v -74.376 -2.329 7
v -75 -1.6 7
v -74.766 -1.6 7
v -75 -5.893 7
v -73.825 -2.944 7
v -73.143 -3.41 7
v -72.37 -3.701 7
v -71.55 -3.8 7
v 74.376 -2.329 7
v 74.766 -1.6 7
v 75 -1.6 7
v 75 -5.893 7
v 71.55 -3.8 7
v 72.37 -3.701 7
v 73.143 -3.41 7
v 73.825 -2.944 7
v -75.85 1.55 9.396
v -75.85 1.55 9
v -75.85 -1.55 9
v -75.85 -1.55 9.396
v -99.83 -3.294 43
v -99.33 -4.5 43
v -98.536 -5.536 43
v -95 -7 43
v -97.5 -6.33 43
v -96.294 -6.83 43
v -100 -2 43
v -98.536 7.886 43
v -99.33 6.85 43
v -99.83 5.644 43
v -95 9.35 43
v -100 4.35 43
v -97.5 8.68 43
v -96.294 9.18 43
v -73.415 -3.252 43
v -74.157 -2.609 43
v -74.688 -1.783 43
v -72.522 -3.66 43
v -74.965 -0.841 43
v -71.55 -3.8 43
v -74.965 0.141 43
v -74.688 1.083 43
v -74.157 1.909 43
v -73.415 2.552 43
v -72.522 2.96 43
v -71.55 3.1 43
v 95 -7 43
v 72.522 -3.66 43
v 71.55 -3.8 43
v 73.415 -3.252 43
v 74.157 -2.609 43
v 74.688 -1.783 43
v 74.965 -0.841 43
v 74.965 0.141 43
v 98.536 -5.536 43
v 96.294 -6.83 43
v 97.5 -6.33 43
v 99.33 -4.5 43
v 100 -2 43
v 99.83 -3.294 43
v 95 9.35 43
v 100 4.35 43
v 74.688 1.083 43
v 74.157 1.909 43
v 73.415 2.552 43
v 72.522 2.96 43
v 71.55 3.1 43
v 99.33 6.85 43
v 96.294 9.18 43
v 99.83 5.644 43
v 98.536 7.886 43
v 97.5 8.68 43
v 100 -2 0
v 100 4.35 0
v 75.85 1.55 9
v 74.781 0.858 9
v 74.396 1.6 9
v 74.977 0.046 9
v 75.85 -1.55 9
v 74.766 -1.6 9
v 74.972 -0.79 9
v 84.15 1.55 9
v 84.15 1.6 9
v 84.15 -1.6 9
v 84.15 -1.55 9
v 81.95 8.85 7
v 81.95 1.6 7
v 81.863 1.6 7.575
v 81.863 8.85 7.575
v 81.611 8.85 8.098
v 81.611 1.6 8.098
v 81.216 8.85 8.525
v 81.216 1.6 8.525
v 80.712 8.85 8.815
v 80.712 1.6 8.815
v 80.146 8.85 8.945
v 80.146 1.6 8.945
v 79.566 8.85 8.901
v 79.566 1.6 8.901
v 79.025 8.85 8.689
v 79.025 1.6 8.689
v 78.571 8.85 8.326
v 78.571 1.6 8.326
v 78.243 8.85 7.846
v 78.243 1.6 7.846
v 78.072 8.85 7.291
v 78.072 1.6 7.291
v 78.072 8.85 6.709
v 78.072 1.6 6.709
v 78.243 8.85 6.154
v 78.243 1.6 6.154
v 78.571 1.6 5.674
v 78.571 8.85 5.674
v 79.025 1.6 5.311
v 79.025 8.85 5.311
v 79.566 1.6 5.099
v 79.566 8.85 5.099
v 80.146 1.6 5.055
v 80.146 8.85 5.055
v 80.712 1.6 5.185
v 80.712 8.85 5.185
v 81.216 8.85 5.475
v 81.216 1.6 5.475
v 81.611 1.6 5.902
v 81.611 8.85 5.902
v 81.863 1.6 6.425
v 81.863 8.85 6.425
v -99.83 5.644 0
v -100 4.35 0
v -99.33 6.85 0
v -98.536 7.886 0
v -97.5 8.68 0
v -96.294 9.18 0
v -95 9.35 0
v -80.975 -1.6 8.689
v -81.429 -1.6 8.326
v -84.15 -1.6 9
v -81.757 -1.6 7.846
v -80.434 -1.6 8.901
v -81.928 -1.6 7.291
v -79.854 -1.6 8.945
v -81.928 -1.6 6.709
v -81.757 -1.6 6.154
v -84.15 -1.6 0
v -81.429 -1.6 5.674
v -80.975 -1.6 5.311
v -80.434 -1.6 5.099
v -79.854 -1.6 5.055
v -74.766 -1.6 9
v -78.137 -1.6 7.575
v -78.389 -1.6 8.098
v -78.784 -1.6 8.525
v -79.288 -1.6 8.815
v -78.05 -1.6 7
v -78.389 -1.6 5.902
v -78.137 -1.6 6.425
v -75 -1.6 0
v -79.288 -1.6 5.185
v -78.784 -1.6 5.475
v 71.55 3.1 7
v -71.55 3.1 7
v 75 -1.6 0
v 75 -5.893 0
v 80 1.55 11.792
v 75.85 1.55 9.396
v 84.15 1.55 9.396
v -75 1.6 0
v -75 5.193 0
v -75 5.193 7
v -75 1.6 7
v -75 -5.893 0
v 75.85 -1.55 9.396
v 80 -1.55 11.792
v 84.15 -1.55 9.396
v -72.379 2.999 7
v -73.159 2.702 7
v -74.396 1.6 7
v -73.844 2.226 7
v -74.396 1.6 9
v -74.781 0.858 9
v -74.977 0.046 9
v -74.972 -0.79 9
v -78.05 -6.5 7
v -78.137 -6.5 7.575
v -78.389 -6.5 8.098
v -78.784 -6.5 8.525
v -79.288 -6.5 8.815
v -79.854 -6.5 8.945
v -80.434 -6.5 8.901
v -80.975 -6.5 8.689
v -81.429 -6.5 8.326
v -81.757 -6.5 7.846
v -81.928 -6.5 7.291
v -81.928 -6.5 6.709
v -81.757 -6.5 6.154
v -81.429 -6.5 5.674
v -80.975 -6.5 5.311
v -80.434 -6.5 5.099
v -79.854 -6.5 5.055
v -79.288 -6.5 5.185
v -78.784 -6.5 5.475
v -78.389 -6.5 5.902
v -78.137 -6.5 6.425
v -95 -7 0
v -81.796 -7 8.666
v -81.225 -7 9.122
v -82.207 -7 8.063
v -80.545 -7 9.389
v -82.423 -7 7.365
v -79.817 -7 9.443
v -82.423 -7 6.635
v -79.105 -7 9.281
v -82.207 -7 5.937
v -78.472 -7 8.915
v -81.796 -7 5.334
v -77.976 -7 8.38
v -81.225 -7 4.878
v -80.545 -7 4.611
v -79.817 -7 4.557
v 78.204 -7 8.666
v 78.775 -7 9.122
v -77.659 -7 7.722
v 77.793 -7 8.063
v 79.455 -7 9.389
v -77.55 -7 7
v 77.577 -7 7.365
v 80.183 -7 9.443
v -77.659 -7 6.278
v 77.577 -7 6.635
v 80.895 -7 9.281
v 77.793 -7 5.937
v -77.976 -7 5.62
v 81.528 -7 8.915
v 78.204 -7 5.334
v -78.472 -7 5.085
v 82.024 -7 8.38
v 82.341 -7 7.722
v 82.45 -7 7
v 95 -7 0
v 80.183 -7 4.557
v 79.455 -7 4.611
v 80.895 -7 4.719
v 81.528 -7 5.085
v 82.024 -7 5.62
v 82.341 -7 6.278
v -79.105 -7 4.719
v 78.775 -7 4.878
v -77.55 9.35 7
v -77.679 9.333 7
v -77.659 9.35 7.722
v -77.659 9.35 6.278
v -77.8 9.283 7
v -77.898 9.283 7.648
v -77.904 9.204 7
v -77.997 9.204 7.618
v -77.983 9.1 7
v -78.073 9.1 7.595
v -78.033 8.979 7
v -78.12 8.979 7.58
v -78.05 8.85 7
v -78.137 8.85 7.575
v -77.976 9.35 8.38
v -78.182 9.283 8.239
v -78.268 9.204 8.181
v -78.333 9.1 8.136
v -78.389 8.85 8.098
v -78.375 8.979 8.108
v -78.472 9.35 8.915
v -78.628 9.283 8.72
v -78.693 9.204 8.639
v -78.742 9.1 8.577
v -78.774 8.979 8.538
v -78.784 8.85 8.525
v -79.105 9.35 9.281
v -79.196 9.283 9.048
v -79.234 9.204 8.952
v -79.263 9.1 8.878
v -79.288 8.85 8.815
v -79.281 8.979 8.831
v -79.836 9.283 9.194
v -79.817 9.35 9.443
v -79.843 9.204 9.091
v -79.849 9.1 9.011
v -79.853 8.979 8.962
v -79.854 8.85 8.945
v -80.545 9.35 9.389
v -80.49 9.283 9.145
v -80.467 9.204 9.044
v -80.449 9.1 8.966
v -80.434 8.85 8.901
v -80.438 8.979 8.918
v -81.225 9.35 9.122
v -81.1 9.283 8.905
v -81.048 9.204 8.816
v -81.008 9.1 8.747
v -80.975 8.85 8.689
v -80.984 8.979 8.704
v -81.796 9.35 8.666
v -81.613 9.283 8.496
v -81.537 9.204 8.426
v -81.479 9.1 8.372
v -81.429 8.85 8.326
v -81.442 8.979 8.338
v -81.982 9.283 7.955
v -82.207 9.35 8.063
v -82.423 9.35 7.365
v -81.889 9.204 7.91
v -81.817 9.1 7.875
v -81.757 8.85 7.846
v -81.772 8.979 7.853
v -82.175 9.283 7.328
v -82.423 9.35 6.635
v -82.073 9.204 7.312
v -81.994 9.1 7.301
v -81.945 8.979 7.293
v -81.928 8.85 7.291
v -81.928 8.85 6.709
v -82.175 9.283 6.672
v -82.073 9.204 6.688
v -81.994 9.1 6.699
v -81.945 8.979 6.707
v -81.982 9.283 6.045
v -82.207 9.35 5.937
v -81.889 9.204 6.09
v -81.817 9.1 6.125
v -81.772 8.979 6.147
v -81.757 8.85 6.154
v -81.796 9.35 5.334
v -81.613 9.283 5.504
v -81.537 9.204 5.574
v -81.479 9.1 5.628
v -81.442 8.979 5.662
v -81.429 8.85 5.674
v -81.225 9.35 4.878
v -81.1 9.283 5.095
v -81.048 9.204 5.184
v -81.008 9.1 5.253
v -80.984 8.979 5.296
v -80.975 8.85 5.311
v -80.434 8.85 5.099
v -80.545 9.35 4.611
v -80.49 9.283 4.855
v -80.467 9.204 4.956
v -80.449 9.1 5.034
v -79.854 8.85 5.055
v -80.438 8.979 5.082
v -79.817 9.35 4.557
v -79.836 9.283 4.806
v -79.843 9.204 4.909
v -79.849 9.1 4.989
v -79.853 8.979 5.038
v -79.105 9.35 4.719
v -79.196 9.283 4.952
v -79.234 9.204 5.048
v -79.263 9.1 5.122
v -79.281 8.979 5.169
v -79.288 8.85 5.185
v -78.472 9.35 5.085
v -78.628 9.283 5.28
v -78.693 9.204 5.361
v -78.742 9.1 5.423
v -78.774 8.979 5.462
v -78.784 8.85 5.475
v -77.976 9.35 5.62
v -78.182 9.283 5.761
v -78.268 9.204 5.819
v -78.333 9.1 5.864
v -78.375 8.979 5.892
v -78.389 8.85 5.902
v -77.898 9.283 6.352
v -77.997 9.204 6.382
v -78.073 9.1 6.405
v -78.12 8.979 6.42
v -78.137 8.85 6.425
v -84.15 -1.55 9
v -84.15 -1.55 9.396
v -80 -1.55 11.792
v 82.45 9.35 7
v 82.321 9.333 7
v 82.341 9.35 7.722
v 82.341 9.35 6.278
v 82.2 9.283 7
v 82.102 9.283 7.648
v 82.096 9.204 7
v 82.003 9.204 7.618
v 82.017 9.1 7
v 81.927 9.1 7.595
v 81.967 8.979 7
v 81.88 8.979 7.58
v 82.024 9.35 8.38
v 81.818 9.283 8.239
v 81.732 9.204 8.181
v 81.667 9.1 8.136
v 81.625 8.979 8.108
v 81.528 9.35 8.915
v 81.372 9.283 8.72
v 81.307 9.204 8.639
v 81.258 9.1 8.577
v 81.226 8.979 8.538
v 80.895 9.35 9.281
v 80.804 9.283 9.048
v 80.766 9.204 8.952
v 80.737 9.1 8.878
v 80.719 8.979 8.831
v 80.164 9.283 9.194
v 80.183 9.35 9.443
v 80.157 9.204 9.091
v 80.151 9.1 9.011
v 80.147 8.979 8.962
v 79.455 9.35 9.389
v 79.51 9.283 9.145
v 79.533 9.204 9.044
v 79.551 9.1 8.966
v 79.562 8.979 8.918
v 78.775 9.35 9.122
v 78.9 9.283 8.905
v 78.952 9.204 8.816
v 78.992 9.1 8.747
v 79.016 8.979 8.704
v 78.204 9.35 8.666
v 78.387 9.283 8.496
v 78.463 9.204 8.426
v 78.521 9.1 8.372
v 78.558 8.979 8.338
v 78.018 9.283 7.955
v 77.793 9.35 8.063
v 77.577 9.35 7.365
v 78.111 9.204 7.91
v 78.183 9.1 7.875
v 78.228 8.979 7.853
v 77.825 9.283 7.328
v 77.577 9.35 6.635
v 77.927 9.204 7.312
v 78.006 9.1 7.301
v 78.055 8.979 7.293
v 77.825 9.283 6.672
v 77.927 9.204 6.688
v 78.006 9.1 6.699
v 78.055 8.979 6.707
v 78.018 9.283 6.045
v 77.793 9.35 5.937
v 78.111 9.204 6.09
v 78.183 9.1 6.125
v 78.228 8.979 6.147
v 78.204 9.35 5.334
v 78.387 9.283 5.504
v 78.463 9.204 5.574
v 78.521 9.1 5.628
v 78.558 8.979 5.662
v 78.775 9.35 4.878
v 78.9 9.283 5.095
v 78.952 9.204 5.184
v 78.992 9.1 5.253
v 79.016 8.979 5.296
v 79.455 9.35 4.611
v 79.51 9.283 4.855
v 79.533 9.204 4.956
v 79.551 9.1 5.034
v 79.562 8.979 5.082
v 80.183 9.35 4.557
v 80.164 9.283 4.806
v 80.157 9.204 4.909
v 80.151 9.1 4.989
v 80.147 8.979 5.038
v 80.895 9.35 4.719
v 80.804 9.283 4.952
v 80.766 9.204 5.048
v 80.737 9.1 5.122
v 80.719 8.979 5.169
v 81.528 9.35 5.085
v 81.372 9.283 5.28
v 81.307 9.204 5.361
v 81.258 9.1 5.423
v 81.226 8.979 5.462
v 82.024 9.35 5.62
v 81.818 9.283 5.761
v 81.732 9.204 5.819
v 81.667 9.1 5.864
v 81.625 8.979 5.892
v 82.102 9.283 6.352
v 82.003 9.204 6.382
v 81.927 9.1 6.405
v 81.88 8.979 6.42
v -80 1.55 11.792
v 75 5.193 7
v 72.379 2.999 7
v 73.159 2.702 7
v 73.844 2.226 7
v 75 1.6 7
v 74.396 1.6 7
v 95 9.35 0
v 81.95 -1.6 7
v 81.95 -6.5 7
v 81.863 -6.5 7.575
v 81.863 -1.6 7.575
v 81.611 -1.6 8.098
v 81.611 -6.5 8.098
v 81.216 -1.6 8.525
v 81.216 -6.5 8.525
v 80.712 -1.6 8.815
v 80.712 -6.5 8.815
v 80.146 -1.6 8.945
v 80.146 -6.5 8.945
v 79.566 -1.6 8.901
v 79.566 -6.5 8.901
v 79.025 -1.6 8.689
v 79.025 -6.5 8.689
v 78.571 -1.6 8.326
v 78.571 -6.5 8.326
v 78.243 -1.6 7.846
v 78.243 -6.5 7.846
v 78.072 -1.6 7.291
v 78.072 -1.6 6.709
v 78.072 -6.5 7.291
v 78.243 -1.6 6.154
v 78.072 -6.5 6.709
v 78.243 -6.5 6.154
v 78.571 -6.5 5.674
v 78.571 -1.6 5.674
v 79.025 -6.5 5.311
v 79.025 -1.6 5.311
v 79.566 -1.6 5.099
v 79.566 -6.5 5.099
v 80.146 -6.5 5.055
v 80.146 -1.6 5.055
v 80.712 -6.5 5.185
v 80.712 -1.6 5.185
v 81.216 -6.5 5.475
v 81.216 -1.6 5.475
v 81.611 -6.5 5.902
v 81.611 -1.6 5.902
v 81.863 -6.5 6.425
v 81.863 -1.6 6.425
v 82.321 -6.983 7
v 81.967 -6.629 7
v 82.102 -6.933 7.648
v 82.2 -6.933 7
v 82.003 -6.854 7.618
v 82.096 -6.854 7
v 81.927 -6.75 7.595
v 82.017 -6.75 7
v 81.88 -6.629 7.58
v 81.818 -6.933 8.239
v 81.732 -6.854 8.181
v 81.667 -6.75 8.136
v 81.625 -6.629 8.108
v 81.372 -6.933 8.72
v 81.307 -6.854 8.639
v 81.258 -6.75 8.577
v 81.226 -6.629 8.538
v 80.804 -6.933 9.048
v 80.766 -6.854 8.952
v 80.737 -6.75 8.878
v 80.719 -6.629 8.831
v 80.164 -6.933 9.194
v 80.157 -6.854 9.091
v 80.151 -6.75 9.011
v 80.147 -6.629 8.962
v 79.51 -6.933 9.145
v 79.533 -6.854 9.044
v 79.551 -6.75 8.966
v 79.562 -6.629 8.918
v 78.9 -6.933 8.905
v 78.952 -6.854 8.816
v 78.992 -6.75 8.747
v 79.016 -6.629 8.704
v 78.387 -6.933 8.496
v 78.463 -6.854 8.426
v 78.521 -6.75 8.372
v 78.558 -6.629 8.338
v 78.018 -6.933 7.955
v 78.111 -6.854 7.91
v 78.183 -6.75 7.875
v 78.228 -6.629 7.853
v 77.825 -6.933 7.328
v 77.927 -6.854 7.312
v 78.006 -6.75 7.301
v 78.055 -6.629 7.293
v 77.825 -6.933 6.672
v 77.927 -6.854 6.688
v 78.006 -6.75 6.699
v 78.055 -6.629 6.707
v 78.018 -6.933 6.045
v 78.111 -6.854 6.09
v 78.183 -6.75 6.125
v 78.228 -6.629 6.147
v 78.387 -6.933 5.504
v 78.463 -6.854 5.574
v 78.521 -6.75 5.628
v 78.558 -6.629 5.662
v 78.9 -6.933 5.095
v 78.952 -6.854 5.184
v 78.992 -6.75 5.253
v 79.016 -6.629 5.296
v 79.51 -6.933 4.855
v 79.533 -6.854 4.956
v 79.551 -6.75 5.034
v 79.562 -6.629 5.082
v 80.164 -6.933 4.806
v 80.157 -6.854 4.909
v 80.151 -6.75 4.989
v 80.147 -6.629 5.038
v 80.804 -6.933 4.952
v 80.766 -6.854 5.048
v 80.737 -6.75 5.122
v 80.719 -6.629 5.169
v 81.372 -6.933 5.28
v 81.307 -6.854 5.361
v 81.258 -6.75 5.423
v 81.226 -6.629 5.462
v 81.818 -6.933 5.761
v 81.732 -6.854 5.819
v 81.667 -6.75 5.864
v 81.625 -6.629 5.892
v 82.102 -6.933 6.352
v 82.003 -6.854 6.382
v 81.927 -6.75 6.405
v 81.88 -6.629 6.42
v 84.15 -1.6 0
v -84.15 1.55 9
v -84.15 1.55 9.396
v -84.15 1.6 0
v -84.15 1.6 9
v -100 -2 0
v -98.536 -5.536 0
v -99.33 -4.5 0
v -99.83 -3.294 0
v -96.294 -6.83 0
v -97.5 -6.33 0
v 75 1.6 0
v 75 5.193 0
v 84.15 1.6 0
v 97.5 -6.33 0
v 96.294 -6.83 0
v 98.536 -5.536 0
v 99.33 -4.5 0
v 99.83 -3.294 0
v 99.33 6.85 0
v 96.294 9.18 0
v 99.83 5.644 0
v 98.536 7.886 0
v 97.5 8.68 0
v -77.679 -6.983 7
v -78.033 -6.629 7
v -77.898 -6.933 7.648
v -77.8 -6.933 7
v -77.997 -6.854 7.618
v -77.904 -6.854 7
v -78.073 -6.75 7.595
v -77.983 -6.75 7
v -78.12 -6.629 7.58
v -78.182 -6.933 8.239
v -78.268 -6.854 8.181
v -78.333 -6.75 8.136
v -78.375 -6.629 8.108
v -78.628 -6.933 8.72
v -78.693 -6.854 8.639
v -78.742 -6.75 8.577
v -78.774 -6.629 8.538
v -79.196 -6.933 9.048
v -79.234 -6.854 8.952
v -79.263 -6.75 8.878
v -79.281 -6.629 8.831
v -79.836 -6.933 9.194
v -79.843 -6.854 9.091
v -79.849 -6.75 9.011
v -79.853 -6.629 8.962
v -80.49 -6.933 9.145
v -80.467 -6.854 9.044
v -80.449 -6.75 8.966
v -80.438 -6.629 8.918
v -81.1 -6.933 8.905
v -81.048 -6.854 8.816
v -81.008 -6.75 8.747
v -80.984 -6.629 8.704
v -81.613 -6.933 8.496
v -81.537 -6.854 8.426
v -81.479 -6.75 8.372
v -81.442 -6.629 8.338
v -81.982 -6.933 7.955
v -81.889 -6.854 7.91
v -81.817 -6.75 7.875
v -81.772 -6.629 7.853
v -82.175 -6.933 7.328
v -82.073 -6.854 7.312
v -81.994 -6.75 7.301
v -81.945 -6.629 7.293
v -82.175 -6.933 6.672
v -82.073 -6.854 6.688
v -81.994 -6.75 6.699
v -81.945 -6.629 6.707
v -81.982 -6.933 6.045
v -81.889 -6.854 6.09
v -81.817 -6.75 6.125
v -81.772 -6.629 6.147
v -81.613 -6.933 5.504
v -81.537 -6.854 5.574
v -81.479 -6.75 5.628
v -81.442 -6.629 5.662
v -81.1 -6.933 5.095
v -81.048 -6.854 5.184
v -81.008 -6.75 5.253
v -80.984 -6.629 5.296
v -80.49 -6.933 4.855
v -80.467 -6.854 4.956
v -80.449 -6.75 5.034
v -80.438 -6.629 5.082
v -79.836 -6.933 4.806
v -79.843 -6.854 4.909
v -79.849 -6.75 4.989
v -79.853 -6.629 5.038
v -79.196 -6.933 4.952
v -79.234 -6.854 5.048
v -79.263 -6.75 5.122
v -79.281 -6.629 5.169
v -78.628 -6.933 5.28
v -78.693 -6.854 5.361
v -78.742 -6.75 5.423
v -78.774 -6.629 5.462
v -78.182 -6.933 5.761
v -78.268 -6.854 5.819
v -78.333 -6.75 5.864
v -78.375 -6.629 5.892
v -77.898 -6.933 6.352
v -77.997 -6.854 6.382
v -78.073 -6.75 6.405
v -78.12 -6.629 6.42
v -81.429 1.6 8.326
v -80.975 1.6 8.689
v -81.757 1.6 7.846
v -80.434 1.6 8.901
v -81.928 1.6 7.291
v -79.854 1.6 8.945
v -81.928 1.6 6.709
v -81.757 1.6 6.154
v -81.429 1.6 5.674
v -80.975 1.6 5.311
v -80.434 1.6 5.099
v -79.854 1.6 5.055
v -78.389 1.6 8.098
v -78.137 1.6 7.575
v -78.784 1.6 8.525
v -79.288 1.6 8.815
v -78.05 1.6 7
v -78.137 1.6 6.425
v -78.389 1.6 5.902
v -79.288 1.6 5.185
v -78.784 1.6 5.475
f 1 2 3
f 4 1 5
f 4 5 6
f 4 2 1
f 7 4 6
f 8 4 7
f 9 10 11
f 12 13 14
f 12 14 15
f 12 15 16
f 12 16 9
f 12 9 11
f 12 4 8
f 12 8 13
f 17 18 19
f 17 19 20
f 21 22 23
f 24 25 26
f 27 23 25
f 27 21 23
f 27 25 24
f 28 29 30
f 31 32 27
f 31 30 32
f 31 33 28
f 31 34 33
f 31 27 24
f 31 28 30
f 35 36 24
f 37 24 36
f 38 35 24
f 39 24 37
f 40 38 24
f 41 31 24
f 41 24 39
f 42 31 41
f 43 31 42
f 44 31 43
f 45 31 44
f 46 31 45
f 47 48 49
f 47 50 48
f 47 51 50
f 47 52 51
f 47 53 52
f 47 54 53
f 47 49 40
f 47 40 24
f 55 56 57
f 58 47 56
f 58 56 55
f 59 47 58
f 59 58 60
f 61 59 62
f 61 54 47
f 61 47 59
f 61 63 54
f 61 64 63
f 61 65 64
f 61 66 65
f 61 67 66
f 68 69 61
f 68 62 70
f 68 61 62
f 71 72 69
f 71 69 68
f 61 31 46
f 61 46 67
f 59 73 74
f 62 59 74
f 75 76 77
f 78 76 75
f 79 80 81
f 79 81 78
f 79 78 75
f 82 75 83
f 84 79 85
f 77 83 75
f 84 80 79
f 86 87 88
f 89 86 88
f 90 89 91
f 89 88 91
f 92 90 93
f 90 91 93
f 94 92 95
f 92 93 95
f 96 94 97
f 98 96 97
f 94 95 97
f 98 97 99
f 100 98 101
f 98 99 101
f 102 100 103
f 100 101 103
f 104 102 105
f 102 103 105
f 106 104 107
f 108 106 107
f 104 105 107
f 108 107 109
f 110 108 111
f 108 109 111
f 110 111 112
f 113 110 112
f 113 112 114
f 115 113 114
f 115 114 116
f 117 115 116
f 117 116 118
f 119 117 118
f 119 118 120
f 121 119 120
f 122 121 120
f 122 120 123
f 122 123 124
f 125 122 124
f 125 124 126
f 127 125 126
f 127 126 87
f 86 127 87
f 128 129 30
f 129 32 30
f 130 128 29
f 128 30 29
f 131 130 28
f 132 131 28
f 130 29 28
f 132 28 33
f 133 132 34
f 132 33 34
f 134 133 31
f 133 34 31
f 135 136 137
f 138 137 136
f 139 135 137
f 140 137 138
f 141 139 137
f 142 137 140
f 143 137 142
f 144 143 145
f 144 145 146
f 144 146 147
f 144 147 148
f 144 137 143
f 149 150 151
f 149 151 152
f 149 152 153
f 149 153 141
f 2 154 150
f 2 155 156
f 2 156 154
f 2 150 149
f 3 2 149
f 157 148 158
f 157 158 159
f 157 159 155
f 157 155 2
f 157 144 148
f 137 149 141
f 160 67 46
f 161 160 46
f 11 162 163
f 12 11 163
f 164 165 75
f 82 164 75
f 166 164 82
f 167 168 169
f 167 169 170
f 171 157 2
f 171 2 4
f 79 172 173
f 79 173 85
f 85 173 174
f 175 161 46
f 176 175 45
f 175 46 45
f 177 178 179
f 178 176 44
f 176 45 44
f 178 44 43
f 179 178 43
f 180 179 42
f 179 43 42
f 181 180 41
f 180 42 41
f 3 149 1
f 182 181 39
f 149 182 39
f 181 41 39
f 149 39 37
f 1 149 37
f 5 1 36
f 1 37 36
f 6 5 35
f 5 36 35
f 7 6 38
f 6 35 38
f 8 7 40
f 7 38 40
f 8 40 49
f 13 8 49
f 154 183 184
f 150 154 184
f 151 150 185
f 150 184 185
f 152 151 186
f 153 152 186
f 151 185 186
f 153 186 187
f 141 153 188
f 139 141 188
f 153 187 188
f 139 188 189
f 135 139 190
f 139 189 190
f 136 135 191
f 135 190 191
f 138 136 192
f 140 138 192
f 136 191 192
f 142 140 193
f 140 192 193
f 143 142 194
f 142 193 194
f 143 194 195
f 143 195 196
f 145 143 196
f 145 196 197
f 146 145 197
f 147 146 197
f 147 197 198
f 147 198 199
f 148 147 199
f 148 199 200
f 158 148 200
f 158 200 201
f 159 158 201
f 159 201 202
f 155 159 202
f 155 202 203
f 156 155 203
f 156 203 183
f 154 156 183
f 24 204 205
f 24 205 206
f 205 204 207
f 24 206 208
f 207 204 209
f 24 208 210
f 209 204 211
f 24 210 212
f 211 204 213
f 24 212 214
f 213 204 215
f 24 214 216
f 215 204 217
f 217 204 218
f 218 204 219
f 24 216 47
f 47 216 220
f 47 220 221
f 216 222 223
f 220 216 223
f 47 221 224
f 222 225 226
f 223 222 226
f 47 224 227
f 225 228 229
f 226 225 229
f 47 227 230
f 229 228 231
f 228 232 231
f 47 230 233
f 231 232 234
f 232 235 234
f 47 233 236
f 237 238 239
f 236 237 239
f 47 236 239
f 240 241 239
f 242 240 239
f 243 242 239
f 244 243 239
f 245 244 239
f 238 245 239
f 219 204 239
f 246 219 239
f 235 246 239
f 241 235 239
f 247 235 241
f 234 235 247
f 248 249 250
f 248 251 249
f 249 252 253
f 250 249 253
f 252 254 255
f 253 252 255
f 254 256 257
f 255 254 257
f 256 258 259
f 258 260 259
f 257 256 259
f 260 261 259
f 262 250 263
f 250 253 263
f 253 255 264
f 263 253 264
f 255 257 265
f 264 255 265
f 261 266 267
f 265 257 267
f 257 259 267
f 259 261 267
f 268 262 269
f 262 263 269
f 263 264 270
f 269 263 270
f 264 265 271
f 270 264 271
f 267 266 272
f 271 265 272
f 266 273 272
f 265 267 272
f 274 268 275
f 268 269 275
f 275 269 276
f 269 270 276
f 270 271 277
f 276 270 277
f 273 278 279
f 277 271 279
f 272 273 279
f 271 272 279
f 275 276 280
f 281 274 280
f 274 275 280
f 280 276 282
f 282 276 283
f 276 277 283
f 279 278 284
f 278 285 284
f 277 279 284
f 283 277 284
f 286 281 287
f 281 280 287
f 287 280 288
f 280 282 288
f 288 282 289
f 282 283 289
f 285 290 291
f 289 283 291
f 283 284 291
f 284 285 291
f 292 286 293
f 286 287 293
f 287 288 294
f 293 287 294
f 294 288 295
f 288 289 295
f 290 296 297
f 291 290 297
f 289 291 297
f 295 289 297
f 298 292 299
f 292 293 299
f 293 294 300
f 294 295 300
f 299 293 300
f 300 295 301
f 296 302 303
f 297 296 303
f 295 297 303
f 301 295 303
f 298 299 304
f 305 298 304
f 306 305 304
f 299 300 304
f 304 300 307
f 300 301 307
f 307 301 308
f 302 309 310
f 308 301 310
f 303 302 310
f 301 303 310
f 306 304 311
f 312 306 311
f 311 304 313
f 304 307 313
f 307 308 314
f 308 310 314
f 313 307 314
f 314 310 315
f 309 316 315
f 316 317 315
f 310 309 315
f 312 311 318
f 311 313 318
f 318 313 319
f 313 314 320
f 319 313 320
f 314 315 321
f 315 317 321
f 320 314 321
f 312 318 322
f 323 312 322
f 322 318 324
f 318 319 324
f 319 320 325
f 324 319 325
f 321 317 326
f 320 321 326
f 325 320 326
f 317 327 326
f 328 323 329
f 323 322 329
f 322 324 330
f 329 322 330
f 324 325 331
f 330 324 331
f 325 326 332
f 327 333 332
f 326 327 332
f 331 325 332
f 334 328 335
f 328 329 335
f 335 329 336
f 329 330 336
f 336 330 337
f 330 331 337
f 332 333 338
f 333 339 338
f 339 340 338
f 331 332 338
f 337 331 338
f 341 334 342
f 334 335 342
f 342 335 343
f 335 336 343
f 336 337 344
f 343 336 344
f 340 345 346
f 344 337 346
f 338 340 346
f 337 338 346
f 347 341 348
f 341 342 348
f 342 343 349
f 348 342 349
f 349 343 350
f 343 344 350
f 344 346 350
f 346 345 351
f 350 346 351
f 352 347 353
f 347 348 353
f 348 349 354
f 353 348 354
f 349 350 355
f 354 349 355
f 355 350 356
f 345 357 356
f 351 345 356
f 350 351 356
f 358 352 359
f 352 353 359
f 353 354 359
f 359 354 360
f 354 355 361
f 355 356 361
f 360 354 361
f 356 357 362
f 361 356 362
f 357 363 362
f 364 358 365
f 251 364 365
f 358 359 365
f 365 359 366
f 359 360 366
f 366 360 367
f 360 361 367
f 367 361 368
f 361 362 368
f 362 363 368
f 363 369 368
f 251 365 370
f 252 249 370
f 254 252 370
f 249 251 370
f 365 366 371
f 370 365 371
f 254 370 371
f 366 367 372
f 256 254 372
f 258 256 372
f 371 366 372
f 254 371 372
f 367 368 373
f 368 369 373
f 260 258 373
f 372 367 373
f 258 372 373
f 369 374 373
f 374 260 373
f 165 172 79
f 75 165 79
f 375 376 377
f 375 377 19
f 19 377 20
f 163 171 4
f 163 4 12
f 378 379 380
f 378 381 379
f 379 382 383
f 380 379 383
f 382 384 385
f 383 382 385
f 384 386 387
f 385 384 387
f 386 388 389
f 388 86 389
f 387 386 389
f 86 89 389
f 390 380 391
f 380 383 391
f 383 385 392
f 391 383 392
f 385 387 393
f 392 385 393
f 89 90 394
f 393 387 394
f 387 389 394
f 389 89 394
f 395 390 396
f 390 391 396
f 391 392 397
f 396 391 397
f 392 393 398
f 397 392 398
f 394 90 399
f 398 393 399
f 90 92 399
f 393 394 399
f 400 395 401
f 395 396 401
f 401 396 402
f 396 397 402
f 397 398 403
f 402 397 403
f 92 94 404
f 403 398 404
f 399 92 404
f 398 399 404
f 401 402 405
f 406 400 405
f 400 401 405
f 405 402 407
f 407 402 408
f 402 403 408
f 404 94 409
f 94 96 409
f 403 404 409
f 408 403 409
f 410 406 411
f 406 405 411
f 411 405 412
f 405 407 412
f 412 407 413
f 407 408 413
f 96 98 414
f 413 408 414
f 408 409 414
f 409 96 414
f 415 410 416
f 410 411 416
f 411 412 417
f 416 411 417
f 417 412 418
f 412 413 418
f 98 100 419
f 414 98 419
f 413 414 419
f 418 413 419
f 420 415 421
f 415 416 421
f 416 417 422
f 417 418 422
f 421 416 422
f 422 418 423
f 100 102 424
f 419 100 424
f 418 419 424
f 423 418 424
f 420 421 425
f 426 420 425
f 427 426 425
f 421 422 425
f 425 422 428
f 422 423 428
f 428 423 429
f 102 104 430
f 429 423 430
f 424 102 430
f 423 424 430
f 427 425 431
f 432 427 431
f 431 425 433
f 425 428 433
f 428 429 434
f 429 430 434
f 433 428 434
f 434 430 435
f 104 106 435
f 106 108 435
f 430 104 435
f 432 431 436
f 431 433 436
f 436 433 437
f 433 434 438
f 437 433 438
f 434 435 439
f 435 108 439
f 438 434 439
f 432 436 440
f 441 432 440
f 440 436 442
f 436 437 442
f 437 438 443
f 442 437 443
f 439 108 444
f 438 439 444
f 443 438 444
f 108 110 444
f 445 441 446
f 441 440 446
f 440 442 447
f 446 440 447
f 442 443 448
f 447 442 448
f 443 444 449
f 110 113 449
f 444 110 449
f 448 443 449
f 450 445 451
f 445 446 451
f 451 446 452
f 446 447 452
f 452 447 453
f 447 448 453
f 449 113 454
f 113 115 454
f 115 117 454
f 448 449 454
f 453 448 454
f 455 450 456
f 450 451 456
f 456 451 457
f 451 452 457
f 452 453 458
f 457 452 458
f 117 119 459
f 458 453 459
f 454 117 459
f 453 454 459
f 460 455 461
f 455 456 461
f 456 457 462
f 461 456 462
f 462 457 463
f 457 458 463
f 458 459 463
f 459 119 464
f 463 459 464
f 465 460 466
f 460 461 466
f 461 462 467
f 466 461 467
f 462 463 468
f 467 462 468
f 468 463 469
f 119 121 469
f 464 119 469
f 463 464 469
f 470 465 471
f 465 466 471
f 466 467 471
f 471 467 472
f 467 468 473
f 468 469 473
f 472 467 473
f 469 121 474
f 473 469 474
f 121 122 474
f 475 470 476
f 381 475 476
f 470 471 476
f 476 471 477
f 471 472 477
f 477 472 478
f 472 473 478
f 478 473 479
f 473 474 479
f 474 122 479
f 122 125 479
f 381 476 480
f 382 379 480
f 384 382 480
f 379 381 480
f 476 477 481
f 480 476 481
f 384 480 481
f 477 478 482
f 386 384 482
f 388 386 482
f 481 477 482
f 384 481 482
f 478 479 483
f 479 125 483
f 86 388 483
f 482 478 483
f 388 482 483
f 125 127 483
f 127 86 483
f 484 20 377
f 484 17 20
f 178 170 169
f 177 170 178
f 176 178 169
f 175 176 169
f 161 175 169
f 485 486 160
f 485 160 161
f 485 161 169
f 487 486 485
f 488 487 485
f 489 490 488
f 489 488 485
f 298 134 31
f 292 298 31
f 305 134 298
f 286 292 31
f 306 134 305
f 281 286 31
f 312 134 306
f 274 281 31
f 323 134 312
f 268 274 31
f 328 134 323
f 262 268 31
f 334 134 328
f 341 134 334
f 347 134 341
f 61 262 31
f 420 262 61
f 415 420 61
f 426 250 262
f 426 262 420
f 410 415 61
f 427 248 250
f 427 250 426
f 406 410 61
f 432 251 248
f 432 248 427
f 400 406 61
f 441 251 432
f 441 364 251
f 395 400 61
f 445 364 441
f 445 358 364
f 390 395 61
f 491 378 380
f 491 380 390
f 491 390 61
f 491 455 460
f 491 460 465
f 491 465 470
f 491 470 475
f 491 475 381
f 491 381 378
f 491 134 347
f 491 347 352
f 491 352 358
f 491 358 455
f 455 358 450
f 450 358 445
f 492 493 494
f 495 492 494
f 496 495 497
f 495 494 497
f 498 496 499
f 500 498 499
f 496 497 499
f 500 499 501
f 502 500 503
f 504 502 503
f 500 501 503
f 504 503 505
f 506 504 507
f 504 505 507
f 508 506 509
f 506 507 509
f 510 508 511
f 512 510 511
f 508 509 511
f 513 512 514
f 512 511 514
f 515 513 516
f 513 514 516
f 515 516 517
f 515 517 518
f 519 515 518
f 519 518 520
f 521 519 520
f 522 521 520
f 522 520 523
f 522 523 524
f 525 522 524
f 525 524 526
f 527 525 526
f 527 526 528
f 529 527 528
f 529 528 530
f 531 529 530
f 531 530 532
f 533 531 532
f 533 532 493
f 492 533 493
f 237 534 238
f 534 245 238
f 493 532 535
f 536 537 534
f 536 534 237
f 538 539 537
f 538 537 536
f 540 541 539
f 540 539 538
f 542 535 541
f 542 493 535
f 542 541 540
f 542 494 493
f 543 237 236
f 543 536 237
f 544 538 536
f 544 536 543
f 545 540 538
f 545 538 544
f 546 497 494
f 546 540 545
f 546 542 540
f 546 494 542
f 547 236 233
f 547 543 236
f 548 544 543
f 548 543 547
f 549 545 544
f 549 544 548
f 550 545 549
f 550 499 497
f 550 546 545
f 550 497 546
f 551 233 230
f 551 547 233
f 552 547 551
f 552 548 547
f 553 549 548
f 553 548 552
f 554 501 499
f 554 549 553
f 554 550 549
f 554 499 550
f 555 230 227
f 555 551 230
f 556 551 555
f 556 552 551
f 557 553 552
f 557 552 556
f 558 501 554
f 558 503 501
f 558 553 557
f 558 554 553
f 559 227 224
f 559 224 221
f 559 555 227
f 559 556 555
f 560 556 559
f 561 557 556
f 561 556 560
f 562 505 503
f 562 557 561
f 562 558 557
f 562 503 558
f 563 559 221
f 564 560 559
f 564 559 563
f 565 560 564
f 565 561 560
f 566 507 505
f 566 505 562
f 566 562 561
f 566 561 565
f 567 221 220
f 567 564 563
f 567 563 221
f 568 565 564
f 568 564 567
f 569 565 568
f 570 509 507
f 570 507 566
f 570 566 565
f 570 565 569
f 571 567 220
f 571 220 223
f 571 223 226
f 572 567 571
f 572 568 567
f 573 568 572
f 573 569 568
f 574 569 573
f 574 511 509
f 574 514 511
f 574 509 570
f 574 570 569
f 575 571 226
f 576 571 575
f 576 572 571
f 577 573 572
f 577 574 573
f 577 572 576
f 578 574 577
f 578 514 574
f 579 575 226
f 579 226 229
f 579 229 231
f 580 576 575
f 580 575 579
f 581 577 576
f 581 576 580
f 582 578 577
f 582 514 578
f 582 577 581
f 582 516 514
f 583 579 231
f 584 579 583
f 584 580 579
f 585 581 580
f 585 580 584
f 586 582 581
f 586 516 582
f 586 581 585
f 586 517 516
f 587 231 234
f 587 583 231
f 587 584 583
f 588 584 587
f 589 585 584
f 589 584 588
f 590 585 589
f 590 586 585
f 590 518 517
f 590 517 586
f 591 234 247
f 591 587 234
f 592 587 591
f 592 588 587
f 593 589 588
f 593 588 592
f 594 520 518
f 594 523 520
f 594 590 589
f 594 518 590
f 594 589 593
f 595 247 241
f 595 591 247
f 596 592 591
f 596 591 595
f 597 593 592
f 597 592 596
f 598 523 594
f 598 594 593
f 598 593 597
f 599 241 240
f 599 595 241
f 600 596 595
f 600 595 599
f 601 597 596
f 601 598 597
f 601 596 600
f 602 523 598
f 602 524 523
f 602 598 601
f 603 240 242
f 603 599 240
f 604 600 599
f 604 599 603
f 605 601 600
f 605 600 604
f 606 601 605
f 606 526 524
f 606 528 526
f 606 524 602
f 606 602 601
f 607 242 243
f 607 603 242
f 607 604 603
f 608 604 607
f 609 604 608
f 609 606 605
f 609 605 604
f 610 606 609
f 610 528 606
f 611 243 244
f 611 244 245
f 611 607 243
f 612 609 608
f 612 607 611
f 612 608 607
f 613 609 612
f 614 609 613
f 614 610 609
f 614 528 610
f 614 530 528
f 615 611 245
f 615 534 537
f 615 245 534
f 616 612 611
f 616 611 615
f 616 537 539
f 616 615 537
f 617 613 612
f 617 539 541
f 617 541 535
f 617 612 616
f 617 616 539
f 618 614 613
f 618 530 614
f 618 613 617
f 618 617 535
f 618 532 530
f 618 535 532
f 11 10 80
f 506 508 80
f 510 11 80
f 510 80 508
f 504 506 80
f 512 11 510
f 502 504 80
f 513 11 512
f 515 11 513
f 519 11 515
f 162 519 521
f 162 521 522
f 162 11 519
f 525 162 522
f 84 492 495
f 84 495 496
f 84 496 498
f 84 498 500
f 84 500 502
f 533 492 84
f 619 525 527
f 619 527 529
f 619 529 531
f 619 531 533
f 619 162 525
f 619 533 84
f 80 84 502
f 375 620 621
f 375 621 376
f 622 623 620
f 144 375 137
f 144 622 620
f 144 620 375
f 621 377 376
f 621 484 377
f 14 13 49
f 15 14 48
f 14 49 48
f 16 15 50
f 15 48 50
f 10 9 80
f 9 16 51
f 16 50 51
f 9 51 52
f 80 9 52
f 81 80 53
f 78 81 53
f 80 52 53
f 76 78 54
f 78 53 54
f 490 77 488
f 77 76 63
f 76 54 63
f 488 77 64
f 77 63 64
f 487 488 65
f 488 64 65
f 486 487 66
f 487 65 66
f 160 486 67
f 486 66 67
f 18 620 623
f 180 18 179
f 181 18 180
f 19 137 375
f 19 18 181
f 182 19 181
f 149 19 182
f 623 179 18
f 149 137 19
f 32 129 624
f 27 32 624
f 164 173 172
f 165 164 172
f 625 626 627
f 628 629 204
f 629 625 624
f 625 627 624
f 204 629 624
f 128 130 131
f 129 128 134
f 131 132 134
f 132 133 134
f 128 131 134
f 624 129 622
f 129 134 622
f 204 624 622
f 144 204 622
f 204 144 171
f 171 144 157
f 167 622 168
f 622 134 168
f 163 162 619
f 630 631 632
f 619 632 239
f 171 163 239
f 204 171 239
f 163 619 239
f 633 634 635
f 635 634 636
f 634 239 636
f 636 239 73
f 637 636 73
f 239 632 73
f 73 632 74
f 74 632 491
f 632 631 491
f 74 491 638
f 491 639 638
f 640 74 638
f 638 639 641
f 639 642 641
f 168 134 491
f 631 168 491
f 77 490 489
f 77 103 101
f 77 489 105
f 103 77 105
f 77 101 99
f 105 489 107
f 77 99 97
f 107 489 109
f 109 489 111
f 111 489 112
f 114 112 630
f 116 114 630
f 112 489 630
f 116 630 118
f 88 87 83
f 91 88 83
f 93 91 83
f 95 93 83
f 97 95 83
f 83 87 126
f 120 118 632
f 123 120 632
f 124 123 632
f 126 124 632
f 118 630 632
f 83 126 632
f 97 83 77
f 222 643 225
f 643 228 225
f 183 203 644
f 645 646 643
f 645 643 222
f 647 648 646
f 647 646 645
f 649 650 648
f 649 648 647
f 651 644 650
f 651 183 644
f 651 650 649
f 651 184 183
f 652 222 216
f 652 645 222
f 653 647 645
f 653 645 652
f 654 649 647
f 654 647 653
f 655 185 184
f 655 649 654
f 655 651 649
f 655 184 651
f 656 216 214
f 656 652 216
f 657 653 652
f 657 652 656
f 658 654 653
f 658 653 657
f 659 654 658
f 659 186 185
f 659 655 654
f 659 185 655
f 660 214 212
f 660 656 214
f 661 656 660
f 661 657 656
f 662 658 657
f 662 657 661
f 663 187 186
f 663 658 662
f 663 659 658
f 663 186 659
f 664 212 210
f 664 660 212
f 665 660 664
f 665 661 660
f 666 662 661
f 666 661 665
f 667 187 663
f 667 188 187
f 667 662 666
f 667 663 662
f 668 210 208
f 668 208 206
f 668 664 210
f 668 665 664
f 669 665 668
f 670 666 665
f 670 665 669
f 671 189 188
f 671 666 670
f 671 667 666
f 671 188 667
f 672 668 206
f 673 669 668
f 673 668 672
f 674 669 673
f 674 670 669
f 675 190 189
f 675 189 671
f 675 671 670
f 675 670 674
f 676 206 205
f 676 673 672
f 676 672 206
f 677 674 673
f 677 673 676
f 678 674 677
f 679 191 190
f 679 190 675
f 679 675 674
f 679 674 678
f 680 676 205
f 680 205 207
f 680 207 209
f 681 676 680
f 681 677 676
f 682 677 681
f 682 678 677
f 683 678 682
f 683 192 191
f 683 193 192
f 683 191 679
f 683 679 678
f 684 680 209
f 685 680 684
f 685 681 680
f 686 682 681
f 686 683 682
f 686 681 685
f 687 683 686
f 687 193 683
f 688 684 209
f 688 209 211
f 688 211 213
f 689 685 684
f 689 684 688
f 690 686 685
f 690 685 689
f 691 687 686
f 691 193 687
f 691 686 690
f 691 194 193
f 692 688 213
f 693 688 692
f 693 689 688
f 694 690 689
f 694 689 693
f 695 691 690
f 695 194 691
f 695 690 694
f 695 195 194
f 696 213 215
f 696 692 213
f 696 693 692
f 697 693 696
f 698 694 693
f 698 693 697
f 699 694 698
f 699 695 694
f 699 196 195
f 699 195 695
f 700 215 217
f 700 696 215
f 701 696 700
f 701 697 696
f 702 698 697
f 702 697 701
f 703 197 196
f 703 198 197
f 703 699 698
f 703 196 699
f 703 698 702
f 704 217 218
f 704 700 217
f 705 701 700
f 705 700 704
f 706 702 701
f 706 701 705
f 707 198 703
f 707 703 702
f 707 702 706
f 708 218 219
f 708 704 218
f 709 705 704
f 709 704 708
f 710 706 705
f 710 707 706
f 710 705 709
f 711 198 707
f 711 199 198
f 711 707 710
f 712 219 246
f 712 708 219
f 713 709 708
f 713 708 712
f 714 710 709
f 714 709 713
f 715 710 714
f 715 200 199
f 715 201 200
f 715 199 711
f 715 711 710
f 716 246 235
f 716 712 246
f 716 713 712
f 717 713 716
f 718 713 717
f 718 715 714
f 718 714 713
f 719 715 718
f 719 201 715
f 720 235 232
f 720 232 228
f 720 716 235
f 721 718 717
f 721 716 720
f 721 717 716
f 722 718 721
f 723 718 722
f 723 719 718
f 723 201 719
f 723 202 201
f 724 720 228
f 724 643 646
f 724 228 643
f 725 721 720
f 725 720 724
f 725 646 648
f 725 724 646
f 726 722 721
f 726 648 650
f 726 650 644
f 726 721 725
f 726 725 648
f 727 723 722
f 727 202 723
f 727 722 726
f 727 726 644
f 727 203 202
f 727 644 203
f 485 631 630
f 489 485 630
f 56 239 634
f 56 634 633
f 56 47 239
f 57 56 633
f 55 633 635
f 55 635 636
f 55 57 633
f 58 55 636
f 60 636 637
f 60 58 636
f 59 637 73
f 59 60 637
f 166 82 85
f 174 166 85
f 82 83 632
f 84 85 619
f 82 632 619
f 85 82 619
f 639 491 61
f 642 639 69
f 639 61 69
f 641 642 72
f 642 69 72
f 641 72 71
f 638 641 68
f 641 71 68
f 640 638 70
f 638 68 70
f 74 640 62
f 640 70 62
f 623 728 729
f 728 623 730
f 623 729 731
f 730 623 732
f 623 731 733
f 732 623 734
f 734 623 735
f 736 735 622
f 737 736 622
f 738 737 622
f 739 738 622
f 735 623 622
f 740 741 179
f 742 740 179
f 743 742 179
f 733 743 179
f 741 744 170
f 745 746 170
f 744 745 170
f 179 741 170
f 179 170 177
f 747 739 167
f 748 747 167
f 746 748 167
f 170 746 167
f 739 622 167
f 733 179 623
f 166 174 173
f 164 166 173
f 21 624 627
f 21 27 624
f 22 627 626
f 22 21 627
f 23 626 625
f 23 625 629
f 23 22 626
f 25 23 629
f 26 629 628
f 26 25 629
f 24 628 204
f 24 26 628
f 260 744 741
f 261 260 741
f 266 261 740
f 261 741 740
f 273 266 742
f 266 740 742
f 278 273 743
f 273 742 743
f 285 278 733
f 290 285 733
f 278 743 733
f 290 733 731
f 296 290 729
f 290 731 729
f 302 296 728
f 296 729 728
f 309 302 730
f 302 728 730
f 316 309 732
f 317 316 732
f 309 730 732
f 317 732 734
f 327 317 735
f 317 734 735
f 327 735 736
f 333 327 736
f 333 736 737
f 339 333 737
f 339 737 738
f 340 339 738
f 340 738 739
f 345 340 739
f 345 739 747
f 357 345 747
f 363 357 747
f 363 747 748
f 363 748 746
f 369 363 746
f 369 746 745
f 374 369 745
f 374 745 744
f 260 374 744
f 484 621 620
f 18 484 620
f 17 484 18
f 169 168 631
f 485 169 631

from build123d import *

# Parameters (mm, degrees)
F0_W      = 200
F0_H      = 2.35
F0_H_2    = 14
F1_DEPTH  = 43
F4_W      = 150
F4_H      = 11.08513
F5_DEPTH  = 7
F6_R      = 1.95
F7_DEPTH  = 16.351
F9_DEPTH  = 37
F10_R     = 5
F11_R     = 0.5
F13_DEPTH = 1.55
F14_W     = 18.3
F14_H     = 3.2
F15_DEPTH = 9


with BuildPart() as f1:
    # F0 (on Top) → F1 (new body)
    with BuildSketch(Plane.XY):
        with Locations((0, 8.175)):
            Rectangle(F0_W, F0_H)
        Rectangle(F0_W, F0_H_2)
    extrude(amount=F1_DEPTH)

    # F4 (on face) → F5 (cut)
    with BuildSketch(Plane(origin=(0, 0, 0), x_dir=(1, 0, 0), z_dir=(0, 0, -1))):
        with Locations((0, 0.35)):
            Rectangle(F4_W, F4_H)
    extrude(amount=-F5_DEPTH, mode=Mode.SUBTRACT)

    # F6 (on face) → F7 (cut, through all)
    with BuildSketch(Plane.XZ.offset(7)):
        with Locations((-80, 7)):
            Circle(F6_R)
        with Locations((80, 7)):
            Circle(F6_R)
    extrude(amount=-F7_DEPTH, mode=Mode.SUBTRACT)

    # F8 (on face) → F9 (cut)
    with BuildSketch(Plane.XY.offset(43)):
        with BuildLine():
            ThreePointArc((-71.55, 3.1), (-75, -0.35), (-71.55, -3.8))
            Line((-71.55, -3.8), (71.55, -3.8))
            ThreePointArc((71.55, -3.8), (75, -0.35), (71.55, 3.1))
            Line((71.55, 3.1), (-71.55, 3.1))
        make_face()
    extrude(amount=-F9_DEPTH, mode=Mode.SUBTRACT)

    # F10
    f10_edges = [f1.edges().sort_by_distance(p)[0] for p in [
        (-100, -7, 21.5),
        (-100, 9.35, 21.5),
        (100, -7, 21.5),
        (100, 9.35, 21.5),
    ]]
    fillet(f10_edges, radius=F10_R)

    # F11
    f11_edges = [f1.edges().sort_by_distance(p)[0] for p in [
        (78.05, 9.35, 7),
        (78.05, -7, 7),
        (-81.95, -7, 7),
        (-81.95, 9.35, 7),
    ]]
    fillet(f11_edges, radius=F11_R)

    # F12 (on Front) → F13 (cut, symmetric)
    with BuildSketch(Plane.XZ):
        Polygon((-75.85, 4.603996), (-75.85, 9.396004), (-80, 11.792007), (-84.15, 9.396004), (-84.15, 4.603996), (-80, 2.207993), align=None)
        Polygon((84.15, 4.603996), (84.15, 9.396004), (80, 11.792007), (75.85, 9.396004), (75.85, 4.603996), (80, 2.207993), align=None)
    extrude(amount=F13_DEPTH, both=True, mode=Mode.SUBTRACT)

    # F14 (on face) → F15 (cut)
    with BuildSketch(Plane(origin=(0, 0, 0), x_dir=(1, 0, 0), z_dir=(0, 0, -1))):
        with Locations((-75, 0)):
            Rectangle(F14_W, F14_H)
        with Locations((75, 0)):
            Rectangle(F14_W, F14_H)
    extrude(amount=-F15_DEPTH, mode=Mode.SUBTRACT)


solid = f1.part
